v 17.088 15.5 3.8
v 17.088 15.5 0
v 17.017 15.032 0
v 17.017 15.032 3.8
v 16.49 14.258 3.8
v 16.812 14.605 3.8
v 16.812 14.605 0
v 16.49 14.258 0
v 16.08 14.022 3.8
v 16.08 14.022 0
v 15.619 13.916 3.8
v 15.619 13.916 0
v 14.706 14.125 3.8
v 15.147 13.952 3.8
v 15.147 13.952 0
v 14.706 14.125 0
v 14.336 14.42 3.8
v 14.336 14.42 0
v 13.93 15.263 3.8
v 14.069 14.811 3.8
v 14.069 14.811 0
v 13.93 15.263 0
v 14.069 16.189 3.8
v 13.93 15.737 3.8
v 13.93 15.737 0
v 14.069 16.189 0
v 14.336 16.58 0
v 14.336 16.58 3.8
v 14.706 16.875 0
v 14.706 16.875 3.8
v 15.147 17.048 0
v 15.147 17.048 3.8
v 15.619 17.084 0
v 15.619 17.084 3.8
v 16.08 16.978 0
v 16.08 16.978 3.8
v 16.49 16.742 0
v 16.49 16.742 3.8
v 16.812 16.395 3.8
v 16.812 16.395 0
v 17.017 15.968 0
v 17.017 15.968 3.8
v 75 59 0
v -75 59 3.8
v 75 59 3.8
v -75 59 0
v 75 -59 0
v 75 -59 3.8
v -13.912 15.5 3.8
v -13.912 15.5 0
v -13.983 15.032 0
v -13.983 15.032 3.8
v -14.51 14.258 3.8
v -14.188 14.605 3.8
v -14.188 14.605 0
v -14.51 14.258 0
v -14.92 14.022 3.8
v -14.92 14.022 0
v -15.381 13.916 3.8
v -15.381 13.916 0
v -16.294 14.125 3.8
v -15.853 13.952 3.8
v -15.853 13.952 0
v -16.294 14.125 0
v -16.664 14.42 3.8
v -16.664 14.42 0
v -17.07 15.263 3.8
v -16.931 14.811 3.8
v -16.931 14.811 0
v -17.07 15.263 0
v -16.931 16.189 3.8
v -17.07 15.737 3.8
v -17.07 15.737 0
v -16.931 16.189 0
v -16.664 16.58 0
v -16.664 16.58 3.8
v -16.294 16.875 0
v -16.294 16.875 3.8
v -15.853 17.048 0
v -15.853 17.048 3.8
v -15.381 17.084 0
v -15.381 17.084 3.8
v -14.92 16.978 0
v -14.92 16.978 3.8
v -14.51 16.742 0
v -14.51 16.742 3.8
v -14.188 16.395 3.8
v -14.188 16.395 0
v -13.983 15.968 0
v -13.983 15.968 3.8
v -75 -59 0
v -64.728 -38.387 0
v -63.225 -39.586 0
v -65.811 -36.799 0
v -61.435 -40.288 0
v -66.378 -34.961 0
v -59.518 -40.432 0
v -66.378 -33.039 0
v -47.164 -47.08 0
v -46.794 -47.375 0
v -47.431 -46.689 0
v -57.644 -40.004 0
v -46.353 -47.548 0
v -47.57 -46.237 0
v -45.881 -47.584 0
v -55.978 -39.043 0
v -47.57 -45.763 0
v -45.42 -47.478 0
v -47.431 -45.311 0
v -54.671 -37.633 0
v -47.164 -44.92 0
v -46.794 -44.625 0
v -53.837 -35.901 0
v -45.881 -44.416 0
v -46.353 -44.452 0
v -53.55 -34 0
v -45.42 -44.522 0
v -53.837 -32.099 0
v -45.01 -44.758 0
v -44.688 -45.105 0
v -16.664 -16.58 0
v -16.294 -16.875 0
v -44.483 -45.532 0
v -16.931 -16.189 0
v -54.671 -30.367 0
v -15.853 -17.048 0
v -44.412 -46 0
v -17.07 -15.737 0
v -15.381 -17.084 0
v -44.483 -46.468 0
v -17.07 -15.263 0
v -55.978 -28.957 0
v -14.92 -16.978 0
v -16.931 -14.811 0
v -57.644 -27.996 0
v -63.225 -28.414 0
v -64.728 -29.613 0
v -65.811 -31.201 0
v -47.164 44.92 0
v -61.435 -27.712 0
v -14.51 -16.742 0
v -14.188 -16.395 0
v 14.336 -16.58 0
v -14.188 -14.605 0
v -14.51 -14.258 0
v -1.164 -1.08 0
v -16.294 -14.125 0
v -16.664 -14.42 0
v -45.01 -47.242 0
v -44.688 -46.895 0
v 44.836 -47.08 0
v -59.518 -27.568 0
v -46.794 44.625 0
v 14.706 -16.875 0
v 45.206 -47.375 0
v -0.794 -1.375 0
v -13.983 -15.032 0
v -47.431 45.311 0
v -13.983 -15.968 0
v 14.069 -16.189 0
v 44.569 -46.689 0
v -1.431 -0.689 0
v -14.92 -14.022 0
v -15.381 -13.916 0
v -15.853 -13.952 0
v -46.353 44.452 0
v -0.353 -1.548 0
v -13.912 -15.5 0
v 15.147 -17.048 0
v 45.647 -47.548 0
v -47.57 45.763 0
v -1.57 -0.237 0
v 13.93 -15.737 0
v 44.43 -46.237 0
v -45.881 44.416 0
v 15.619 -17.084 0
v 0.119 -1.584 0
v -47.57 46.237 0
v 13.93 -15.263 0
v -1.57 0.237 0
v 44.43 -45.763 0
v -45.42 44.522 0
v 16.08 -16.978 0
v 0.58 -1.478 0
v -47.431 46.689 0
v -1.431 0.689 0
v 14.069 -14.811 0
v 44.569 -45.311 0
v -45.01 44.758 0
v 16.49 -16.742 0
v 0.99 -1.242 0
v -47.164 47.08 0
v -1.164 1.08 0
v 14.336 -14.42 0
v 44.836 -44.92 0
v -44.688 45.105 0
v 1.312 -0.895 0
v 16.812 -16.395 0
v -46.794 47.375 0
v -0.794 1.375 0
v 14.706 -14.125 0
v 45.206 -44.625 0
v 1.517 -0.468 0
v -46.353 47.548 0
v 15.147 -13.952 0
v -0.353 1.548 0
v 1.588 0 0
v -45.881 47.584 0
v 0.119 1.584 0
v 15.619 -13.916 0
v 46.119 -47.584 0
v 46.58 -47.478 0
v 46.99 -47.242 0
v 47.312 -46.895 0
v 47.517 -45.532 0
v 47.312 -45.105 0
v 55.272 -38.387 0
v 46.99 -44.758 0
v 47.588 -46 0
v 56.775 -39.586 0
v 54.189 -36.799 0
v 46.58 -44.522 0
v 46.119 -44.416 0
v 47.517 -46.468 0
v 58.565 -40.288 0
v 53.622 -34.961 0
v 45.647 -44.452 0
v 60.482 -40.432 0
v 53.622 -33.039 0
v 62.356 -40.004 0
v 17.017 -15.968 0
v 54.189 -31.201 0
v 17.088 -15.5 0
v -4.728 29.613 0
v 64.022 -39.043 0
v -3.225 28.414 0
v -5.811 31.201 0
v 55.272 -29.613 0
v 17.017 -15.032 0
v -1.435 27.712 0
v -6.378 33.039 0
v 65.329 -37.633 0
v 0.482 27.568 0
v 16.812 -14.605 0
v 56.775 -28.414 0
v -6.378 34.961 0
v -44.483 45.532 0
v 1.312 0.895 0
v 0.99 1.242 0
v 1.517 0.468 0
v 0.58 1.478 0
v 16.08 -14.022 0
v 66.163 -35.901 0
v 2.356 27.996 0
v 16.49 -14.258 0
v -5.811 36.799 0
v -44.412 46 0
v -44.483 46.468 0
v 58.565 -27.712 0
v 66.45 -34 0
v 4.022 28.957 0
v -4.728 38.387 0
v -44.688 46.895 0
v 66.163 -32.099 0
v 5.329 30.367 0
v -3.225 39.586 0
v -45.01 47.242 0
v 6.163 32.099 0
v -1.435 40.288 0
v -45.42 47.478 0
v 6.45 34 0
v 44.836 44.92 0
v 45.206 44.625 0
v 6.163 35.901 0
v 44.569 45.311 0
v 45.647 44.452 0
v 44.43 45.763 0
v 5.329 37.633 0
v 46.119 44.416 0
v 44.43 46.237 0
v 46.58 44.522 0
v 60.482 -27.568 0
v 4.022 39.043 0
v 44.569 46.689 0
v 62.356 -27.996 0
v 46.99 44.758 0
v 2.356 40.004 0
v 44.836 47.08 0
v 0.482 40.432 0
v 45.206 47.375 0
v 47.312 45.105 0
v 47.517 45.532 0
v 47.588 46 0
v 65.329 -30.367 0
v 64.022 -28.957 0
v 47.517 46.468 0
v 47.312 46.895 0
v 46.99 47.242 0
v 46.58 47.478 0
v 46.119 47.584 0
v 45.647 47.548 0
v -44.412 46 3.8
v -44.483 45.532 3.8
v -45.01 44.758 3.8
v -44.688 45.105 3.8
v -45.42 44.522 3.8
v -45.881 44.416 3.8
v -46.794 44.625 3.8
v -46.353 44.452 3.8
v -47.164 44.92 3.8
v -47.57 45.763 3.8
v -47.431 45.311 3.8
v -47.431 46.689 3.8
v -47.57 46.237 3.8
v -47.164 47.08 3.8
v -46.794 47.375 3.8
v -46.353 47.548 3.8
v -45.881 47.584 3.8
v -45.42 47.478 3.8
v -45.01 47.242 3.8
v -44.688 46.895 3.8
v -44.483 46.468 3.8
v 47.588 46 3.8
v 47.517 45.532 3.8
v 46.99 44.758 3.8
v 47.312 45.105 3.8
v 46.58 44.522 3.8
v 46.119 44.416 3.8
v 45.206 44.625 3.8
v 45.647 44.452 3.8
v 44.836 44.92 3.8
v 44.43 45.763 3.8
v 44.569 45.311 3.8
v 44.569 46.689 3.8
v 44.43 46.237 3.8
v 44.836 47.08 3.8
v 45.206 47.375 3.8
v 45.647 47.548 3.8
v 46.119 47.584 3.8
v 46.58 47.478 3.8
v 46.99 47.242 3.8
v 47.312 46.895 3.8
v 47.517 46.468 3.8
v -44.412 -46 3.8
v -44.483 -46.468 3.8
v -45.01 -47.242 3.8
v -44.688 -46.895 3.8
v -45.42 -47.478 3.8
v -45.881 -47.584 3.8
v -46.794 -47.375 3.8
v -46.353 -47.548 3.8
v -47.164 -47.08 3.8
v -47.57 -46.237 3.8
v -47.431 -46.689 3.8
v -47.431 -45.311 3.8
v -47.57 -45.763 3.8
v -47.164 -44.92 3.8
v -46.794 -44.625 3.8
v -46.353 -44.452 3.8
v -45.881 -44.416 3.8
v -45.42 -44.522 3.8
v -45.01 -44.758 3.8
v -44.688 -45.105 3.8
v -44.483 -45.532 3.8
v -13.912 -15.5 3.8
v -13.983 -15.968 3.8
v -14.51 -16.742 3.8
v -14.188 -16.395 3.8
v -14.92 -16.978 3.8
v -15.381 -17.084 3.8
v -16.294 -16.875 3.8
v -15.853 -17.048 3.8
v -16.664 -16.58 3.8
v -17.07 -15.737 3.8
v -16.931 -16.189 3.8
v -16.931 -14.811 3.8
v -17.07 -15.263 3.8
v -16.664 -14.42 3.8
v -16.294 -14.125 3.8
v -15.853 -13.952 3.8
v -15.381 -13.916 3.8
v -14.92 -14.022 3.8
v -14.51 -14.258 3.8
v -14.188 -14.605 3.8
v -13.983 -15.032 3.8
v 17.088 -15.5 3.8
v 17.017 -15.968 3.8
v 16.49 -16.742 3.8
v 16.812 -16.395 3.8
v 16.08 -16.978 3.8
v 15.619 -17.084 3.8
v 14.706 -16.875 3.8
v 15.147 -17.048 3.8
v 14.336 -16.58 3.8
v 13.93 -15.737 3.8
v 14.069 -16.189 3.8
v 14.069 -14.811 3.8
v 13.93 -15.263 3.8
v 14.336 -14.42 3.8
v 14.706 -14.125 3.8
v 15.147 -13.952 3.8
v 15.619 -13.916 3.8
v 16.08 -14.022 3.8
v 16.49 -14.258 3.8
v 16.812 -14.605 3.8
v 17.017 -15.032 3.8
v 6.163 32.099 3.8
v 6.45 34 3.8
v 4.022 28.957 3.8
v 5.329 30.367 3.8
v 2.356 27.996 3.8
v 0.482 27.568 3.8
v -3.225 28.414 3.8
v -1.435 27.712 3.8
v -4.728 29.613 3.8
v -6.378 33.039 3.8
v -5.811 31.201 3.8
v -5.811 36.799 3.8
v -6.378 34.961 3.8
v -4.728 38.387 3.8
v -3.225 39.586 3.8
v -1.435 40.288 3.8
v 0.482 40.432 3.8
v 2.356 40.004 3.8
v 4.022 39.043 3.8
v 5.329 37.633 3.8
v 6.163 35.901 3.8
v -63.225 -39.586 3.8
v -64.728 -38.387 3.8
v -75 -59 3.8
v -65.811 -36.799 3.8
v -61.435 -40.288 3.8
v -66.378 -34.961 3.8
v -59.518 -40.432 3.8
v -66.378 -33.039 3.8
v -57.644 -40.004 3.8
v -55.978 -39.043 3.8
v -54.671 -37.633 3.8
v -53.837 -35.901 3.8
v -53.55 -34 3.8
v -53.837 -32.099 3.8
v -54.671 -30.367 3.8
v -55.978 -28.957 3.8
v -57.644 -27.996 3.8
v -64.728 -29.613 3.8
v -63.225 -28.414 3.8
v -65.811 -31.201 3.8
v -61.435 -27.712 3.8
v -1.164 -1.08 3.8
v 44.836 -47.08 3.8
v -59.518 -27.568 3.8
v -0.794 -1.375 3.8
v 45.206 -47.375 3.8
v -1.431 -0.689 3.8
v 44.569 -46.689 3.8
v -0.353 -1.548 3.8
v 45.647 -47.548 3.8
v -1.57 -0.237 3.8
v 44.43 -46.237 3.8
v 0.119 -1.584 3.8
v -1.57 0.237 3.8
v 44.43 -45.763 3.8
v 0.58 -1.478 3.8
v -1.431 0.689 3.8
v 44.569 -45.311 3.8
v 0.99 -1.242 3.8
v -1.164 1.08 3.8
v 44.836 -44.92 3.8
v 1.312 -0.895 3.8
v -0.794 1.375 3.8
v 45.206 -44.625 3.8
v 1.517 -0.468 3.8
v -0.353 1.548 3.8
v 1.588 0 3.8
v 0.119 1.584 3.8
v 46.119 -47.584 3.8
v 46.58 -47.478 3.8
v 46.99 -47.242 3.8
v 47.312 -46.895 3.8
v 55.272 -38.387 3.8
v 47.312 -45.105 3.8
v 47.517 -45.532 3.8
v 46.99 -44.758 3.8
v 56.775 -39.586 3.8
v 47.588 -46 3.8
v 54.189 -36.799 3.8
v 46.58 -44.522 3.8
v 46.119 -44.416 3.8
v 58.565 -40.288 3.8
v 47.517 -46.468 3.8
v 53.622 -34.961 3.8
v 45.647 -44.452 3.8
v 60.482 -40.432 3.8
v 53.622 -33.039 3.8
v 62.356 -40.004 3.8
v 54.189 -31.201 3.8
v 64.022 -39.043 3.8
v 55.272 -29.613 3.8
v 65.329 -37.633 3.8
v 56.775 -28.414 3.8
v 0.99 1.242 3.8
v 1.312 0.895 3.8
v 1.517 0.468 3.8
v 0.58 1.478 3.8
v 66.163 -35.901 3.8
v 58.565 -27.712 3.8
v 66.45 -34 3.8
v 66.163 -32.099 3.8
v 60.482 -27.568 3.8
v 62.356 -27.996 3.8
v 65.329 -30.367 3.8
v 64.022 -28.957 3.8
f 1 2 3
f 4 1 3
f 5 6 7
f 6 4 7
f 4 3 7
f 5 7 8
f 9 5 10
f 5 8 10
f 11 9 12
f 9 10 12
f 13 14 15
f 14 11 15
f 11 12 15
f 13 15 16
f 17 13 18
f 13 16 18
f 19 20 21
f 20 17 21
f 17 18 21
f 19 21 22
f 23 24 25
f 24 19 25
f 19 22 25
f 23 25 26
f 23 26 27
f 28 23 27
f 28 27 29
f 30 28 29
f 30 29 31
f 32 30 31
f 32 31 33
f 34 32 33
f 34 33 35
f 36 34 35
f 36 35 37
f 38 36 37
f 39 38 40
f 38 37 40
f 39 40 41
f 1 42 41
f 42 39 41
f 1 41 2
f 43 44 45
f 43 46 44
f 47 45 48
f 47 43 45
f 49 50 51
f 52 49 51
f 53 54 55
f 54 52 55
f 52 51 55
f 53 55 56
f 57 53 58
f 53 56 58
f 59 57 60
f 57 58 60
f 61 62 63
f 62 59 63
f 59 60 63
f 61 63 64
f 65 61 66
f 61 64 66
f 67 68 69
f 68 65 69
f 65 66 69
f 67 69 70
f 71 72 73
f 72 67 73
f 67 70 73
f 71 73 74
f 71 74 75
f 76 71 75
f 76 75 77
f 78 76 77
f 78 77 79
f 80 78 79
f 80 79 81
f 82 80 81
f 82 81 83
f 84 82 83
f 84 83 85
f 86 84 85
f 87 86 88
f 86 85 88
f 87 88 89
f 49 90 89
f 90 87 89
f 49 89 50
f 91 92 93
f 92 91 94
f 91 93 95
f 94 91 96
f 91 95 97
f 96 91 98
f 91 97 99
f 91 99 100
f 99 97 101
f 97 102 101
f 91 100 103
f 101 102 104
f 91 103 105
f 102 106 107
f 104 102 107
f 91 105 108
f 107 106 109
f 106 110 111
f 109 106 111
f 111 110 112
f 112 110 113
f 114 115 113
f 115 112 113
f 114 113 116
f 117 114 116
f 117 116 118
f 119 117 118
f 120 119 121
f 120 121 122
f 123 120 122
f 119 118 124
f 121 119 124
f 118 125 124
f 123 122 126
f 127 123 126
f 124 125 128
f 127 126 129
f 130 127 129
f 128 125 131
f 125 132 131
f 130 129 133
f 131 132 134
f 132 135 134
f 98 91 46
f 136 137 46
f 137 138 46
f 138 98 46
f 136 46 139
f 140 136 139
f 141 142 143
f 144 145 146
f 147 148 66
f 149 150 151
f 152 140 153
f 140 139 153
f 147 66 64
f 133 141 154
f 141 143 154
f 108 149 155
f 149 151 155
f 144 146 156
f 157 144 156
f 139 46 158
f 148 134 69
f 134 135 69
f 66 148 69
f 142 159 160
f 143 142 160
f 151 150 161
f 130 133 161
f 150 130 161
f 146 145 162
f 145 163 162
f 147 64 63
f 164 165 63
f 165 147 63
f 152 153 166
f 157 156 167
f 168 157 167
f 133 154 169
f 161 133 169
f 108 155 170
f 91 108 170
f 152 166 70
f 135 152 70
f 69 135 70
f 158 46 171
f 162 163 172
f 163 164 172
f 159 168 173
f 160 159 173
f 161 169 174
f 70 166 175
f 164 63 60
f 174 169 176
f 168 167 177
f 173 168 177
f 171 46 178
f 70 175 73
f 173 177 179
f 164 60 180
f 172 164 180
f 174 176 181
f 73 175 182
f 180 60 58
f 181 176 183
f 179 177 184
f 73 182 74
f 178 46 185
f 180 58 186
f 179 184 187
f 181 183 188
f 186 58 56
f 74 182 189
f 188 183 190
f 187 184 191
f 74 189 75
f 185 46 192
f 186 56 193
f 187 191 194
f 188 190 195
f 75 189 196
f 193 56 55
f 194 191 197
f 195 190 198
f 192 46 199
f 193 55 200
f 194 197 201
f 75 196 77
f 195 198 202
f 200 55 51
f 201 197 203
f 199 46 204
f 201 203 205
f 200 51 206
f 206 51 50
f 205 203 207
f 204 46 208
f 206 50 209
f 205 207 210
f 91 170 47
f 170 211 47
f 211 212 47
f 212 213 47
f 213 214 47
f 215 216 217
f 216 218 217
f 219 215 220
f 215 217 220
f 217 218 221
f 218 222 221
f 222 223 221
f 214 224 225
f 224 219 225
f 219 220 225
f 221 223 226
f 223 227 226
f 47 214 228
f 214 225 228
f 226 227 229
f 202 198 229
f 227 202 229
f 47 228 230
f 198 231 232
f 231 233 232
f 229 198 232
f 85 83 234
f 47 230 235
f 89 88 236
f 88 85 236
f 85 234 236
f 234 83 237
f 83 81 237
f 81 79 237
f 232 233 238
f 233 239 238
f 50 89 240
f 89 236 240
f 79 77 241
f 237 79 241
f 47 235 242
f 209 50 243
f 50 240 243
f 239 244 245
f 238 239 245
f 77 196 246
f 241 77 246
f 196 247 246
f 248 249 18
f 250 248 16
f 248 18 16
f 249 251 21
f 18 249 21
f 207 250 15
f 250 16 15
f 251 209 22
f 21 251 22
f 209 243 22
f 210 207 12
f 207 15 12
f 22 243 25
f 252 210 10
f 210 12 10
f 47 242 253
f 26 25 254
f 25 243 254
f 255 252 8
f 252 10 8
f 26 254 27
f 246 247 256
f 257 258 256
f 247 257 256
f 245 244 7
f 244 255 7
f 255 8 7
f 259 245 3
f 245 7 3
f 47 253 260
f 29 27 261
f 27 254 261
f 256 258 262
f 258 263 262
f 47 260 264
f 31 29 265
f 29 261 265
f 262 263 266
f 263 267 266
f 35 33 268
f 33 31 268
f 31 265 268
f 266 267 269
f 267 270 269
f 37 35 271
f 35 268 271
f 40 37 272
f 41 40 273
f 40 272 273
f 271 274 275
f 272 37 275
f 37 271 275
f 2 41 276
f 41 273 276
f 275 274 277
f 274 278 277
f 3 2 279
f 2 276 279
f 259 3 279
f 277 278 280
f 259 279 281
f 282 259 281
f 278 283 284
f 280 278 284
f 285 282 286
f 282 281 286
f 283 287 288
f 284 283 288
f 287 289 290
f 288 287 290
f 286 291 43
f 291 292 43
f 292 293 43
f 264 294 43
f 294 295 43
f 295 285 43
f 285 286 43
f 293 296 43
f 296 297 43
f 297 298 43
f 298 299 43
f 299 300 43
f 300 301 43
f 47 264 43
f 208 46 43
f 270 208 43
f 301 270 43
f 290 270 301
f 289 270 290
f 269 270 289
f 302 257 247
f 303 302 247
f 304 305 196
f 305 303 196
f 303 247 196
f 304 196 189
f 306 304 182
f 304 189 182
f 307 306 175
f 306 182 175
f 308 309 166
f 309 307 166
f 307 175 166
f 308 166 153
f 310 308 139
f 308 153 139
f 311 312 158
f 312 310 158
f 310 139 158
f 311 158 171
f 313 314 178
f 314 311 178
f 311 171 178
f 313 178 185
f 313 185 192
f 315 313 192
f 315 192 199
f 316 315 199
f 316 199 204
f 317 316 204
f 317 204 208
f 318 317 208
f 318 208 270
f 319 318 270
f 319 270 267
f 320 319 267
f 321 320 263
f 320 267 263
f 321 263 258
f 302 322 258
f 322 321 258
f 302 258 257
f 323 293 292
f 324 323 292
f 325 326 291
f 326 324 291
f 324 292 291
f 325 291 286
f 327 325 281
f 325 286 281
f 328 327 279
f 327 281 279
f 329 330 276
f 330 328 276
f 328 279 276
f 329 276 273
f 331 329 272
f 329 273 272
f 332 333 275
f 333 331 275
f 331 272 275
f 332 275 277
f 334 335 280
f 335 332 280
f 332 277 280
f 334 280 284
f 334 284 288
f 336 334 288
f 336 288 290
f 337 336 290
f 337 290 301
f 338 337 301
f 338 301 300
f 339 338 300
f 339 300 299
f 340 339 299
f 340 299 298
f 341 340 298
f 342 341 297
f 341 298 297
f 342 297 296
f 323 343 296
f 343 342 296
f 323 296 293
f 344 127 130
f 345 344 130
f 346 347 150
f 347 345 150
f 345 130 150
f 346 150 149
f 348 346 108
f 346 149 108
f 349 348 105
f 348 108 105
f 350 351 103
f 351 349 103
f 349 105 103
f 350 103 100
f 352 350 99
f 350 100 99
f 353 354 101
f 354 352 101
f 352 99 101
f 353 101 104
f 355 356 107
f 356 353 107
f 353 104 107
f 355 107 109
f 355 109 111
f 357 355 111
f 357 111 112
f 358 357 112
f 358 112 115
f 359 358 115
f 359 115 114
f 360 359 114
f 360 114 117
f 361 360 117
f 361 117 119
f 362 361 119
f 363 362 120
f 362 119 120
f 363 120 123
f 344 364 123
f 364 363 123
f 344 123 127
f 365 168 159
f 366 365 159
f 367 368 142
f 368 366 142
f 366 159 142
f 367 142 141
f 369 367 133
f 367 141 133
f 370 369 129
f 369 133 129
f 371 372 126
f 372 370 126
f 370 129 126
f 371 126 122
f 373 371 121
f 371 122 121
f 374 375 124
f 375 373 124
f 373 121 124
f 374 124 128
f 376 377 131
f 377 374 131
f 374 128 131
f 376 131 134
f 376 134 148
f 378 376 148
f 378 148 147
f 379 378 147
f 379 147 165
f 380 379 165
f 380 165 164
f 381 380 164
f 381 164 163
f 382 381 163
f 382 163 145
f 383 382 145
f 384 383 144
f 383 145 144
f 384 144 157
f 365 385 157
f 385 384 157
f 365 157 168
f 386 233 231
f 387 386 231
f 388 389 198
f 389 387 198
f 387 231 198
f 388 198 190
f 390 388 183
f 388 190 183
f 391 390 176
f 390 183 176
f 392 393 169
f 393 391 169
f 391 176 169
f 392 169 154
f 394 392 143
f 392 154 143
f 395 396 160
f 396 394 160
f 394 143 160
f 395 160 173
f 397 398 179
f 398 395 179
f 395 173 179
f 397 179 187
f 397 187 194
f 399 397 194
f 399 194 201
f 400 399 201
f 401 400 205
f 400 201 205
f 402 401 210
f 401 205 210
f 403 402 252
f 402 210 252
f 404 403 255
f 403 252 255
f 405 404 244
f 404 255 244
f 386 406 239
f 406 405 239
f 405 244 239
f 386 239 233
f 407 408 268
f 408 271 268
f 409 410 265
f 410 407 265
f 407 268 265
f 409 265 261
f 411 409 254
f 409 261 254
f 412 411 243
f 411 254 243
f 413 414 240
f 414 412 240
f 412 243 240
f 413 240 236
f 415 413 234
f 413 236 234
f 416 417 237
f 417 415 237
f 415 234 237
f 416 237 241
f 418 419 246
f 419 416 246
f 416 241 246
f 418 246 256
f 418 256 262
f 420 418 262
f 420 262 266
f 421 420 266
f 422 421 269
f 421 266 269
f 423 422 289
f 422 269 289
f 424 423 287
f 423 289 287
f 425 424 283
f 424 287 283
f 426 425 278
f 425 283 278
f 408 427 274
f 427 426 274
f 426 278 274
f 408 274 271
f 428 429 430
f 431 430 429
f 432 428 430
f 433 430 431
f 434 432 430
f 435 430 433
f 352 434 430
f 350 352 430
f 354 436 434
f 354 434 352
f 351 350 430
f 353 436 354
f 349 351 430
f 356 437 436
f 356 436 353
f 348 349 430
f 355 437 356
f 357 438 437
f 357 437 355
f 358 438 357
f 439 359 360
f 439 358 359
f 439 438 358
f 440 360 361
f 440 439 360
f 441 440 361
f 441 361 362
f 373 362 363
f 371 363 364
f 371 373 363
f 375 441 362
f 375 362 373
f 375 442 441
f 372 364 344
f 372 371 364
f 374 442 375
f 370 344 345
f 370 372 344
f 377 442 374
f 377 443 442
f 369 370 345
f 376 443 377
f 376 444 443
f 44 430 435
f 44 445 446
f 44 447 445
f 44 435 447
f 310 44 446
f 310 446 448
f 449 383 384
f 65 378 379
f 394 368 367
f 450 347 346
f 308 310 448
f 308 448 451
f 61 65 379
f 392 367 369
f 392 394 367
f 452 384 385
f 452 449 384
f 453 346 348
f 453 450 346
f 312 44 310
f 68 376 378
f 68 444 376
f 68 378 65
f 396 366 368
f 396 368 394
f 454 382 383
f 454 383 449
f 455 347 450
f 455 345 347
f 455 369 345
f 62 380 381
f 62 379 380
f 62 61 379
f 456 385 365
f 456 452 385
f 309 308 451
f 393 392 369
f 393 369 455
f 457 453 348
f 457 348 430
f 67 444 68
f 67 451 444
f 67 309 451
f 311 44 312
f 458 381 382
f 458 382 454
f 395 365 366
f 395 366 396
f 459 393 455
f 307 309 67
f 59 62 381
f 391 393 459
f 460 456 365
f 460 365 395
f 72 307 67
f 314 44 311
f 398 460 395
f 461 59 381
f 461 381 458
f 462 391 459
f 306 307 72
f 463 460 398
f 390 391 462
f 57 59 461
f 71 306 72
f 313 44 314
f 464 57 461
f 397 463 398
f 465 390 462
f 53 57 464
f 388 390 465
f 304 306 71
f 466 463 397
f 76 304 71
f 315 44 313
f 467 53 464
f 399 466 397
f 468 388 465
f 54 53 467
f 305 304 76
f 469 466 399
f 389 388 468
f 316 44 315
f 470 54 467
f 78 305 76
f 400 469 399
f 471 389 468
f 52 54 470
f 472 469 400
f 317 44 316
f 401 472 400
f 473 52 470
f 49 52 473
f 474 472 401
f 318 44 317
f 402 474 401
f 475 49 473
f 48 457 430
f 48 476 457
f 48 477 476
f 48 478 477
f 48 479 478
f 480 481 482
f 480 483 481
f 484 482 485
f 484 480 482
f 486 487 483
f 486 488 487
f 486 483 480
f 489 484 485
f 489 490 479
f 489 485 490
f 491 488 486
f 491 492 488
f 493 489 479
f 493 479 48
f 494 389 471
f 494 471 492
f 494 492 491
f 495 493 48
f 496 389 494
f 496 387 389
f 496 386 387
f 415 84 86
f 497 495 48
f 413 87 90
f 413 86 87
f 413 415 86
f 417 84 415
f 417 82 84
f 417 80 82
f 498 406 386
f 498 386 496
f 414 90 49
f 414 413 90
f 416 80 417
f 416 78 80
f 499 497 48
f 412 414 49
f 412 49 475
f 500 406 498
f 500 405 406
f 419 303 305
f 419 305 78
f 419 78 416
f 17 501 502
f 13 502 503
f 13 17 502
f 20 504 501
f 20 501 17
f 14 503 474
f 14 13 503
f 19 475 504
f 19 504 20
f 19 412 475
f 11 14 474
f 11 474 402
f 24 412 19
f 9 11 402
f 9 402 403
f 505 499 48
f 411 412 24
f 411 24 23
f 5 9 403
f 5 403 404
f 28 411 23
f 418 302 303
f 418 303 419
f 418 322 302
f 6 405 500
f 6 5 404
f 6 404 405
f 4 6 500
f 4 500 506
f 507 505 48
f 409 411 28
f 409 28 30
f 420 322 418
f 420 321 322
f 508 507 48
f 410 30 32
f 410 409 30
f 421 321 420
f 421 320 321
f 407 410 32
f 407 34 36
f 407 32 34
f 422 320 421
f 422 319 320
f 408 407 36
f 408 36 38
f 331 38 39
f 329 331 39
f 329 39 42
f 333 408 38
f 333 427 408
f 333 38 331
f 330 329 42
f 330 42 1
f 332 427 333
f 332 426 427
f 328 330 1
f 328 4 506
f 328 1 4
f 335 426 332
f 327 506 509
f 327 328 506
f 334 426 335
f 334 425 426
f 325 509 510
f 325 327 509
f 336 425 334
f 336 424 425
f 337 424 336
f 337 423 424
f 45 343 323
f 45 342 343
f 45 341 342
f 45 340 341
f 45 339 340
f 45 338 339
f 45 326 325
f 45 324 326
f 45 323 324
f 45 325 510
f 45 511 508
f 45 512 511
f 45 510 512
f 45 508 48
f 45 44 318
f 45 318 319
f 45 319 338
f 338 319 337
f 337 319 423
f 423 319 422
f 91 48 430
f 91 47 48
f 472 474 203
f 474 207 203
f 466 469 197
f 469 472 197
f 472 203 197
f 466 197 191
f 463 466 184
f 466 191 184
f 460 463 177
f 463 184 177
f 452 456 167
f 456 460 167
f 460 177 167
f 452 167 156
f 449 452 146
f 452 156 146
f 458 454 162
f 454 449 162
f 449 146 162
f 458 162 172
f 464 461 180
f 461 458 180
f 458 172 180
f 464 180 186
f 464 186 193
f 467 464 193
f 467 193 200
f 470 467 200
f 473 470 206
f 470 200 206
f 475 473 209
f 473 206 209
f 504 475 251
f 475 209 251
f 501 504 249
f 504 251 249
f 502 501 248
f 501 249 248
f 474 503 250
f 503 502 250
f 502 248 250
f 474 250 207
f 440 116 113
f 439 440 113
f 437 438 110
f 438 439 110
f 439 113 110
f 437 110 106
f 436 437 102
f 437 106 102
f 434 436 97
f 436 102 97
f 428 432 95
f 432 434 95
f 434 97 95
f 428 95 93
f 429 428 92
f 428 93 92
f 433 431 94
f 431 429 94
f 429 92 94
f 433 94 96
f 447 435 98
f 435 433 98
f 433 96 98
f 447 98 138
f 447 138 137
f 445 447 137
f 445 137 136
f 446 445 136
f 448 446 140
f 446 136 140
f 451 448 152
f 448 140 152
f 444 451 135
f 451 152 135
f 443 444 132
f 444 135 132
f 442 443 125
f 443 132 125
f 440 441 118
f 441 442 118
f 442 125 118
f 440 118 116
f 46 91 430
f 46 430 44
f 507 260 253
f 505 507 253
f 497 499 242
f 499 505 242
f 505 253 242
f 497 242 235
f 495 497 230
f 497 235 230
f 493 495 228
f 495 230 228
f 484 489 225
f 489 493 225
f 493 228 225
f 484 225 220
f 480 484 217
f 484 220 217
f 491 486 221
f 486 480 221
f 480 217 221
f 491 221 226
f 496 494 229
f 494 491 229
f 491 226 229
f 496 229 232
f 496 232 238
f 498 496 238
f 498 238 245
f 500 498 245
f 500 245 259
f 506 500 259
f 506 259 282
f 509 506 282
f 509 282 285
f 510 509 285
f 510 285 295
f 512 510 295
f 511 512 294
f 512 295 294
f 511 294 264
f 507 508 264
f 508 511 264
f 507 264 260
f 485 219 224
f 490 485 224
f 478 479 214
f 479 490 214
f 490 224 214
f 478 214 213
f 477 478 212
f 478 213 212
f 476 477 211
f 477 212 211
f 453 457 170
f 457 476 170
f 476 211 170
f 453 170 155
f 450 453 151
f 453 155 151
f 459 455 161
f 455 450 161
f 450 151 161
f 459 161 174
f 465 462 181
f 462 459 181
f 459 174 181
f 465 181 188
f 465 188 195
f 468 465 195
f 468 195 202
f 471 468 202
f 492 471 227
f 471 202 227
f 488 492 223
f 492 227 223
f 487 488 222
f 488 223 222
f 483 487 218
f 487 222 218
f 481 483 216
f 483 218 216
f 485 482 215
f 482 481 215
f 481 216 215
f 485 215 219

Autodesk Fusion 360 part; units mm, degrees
sketch "movingPlatform" plane through (0, 0, 0) normal (0, 0, 1) x (1, 0, 0)
  line L0 (-75, 59) -> (75, 59)
  line L1 (75, 59) -> (75, -59)
  line L2 (75, -59) -> (-75, -59)
  line L3 (-75, -59) -> (-75, 59)
  line L4 (-75, 59) -> (75, -59) construction
  line L5 (75, 59) -> (-75, -59) construction
  circle A0 centre (-60, -34) radius 6.45
  line L6 (0, 2.5) -> (0, 20)
  circle A1 centre (60, -34) radius 6.45
  circle A2 centre (0, 34) radius 6.45
  circle A3 centre (-46, -46) radius 1.588
  circle A4 centre (-15.5, -15.5) radius 1.588
  circle A5 centre (0, 0) radius 57 construction
  circle A6 centre (15.5, -15.5) radius 1.588
  circle A7 centre (15.5, 15.5) radius 1.588
  circle A8 centre (46, -46) radius 1.588
  circle A9 centre (-46, 46) radius 1.588
  circle A10 centre (46, 46) radius 1.588
  circle A11 centre (-15.5, 15.5) radius 1.588
  circle A12 centre (0, 0) radius 1.588
  dimension "d1" = 150
  dimension "d2" = 118
  dimension "d3" = 12.9
  dimension "d4" = 120
  dimension "d6" = 68
  dimension "d7" = 25
  dimension "d8" = 25
  dimension "d9" = 3.176
  dimension "d12" = 92
  dimension "d13" = 92
  dimension "d21" = 3.176
  dimension "d24" = 31
  dimension "d25" = 31
  dimension "d27" = 15.5
  dimension "d31" = 114
  dimension "d34" = 46
  dimension "d37" = 46
  dimension "d49" = 15.5
  dimension "d52" = 12.9
  dimension "d53" = 12.9
  dimension "d56" = 3.176
extrude "Extrude3" add sketch "movingPlatform" along normal blind 3.8
equation "d4 = 132.800 mm - 12.8 mm"
